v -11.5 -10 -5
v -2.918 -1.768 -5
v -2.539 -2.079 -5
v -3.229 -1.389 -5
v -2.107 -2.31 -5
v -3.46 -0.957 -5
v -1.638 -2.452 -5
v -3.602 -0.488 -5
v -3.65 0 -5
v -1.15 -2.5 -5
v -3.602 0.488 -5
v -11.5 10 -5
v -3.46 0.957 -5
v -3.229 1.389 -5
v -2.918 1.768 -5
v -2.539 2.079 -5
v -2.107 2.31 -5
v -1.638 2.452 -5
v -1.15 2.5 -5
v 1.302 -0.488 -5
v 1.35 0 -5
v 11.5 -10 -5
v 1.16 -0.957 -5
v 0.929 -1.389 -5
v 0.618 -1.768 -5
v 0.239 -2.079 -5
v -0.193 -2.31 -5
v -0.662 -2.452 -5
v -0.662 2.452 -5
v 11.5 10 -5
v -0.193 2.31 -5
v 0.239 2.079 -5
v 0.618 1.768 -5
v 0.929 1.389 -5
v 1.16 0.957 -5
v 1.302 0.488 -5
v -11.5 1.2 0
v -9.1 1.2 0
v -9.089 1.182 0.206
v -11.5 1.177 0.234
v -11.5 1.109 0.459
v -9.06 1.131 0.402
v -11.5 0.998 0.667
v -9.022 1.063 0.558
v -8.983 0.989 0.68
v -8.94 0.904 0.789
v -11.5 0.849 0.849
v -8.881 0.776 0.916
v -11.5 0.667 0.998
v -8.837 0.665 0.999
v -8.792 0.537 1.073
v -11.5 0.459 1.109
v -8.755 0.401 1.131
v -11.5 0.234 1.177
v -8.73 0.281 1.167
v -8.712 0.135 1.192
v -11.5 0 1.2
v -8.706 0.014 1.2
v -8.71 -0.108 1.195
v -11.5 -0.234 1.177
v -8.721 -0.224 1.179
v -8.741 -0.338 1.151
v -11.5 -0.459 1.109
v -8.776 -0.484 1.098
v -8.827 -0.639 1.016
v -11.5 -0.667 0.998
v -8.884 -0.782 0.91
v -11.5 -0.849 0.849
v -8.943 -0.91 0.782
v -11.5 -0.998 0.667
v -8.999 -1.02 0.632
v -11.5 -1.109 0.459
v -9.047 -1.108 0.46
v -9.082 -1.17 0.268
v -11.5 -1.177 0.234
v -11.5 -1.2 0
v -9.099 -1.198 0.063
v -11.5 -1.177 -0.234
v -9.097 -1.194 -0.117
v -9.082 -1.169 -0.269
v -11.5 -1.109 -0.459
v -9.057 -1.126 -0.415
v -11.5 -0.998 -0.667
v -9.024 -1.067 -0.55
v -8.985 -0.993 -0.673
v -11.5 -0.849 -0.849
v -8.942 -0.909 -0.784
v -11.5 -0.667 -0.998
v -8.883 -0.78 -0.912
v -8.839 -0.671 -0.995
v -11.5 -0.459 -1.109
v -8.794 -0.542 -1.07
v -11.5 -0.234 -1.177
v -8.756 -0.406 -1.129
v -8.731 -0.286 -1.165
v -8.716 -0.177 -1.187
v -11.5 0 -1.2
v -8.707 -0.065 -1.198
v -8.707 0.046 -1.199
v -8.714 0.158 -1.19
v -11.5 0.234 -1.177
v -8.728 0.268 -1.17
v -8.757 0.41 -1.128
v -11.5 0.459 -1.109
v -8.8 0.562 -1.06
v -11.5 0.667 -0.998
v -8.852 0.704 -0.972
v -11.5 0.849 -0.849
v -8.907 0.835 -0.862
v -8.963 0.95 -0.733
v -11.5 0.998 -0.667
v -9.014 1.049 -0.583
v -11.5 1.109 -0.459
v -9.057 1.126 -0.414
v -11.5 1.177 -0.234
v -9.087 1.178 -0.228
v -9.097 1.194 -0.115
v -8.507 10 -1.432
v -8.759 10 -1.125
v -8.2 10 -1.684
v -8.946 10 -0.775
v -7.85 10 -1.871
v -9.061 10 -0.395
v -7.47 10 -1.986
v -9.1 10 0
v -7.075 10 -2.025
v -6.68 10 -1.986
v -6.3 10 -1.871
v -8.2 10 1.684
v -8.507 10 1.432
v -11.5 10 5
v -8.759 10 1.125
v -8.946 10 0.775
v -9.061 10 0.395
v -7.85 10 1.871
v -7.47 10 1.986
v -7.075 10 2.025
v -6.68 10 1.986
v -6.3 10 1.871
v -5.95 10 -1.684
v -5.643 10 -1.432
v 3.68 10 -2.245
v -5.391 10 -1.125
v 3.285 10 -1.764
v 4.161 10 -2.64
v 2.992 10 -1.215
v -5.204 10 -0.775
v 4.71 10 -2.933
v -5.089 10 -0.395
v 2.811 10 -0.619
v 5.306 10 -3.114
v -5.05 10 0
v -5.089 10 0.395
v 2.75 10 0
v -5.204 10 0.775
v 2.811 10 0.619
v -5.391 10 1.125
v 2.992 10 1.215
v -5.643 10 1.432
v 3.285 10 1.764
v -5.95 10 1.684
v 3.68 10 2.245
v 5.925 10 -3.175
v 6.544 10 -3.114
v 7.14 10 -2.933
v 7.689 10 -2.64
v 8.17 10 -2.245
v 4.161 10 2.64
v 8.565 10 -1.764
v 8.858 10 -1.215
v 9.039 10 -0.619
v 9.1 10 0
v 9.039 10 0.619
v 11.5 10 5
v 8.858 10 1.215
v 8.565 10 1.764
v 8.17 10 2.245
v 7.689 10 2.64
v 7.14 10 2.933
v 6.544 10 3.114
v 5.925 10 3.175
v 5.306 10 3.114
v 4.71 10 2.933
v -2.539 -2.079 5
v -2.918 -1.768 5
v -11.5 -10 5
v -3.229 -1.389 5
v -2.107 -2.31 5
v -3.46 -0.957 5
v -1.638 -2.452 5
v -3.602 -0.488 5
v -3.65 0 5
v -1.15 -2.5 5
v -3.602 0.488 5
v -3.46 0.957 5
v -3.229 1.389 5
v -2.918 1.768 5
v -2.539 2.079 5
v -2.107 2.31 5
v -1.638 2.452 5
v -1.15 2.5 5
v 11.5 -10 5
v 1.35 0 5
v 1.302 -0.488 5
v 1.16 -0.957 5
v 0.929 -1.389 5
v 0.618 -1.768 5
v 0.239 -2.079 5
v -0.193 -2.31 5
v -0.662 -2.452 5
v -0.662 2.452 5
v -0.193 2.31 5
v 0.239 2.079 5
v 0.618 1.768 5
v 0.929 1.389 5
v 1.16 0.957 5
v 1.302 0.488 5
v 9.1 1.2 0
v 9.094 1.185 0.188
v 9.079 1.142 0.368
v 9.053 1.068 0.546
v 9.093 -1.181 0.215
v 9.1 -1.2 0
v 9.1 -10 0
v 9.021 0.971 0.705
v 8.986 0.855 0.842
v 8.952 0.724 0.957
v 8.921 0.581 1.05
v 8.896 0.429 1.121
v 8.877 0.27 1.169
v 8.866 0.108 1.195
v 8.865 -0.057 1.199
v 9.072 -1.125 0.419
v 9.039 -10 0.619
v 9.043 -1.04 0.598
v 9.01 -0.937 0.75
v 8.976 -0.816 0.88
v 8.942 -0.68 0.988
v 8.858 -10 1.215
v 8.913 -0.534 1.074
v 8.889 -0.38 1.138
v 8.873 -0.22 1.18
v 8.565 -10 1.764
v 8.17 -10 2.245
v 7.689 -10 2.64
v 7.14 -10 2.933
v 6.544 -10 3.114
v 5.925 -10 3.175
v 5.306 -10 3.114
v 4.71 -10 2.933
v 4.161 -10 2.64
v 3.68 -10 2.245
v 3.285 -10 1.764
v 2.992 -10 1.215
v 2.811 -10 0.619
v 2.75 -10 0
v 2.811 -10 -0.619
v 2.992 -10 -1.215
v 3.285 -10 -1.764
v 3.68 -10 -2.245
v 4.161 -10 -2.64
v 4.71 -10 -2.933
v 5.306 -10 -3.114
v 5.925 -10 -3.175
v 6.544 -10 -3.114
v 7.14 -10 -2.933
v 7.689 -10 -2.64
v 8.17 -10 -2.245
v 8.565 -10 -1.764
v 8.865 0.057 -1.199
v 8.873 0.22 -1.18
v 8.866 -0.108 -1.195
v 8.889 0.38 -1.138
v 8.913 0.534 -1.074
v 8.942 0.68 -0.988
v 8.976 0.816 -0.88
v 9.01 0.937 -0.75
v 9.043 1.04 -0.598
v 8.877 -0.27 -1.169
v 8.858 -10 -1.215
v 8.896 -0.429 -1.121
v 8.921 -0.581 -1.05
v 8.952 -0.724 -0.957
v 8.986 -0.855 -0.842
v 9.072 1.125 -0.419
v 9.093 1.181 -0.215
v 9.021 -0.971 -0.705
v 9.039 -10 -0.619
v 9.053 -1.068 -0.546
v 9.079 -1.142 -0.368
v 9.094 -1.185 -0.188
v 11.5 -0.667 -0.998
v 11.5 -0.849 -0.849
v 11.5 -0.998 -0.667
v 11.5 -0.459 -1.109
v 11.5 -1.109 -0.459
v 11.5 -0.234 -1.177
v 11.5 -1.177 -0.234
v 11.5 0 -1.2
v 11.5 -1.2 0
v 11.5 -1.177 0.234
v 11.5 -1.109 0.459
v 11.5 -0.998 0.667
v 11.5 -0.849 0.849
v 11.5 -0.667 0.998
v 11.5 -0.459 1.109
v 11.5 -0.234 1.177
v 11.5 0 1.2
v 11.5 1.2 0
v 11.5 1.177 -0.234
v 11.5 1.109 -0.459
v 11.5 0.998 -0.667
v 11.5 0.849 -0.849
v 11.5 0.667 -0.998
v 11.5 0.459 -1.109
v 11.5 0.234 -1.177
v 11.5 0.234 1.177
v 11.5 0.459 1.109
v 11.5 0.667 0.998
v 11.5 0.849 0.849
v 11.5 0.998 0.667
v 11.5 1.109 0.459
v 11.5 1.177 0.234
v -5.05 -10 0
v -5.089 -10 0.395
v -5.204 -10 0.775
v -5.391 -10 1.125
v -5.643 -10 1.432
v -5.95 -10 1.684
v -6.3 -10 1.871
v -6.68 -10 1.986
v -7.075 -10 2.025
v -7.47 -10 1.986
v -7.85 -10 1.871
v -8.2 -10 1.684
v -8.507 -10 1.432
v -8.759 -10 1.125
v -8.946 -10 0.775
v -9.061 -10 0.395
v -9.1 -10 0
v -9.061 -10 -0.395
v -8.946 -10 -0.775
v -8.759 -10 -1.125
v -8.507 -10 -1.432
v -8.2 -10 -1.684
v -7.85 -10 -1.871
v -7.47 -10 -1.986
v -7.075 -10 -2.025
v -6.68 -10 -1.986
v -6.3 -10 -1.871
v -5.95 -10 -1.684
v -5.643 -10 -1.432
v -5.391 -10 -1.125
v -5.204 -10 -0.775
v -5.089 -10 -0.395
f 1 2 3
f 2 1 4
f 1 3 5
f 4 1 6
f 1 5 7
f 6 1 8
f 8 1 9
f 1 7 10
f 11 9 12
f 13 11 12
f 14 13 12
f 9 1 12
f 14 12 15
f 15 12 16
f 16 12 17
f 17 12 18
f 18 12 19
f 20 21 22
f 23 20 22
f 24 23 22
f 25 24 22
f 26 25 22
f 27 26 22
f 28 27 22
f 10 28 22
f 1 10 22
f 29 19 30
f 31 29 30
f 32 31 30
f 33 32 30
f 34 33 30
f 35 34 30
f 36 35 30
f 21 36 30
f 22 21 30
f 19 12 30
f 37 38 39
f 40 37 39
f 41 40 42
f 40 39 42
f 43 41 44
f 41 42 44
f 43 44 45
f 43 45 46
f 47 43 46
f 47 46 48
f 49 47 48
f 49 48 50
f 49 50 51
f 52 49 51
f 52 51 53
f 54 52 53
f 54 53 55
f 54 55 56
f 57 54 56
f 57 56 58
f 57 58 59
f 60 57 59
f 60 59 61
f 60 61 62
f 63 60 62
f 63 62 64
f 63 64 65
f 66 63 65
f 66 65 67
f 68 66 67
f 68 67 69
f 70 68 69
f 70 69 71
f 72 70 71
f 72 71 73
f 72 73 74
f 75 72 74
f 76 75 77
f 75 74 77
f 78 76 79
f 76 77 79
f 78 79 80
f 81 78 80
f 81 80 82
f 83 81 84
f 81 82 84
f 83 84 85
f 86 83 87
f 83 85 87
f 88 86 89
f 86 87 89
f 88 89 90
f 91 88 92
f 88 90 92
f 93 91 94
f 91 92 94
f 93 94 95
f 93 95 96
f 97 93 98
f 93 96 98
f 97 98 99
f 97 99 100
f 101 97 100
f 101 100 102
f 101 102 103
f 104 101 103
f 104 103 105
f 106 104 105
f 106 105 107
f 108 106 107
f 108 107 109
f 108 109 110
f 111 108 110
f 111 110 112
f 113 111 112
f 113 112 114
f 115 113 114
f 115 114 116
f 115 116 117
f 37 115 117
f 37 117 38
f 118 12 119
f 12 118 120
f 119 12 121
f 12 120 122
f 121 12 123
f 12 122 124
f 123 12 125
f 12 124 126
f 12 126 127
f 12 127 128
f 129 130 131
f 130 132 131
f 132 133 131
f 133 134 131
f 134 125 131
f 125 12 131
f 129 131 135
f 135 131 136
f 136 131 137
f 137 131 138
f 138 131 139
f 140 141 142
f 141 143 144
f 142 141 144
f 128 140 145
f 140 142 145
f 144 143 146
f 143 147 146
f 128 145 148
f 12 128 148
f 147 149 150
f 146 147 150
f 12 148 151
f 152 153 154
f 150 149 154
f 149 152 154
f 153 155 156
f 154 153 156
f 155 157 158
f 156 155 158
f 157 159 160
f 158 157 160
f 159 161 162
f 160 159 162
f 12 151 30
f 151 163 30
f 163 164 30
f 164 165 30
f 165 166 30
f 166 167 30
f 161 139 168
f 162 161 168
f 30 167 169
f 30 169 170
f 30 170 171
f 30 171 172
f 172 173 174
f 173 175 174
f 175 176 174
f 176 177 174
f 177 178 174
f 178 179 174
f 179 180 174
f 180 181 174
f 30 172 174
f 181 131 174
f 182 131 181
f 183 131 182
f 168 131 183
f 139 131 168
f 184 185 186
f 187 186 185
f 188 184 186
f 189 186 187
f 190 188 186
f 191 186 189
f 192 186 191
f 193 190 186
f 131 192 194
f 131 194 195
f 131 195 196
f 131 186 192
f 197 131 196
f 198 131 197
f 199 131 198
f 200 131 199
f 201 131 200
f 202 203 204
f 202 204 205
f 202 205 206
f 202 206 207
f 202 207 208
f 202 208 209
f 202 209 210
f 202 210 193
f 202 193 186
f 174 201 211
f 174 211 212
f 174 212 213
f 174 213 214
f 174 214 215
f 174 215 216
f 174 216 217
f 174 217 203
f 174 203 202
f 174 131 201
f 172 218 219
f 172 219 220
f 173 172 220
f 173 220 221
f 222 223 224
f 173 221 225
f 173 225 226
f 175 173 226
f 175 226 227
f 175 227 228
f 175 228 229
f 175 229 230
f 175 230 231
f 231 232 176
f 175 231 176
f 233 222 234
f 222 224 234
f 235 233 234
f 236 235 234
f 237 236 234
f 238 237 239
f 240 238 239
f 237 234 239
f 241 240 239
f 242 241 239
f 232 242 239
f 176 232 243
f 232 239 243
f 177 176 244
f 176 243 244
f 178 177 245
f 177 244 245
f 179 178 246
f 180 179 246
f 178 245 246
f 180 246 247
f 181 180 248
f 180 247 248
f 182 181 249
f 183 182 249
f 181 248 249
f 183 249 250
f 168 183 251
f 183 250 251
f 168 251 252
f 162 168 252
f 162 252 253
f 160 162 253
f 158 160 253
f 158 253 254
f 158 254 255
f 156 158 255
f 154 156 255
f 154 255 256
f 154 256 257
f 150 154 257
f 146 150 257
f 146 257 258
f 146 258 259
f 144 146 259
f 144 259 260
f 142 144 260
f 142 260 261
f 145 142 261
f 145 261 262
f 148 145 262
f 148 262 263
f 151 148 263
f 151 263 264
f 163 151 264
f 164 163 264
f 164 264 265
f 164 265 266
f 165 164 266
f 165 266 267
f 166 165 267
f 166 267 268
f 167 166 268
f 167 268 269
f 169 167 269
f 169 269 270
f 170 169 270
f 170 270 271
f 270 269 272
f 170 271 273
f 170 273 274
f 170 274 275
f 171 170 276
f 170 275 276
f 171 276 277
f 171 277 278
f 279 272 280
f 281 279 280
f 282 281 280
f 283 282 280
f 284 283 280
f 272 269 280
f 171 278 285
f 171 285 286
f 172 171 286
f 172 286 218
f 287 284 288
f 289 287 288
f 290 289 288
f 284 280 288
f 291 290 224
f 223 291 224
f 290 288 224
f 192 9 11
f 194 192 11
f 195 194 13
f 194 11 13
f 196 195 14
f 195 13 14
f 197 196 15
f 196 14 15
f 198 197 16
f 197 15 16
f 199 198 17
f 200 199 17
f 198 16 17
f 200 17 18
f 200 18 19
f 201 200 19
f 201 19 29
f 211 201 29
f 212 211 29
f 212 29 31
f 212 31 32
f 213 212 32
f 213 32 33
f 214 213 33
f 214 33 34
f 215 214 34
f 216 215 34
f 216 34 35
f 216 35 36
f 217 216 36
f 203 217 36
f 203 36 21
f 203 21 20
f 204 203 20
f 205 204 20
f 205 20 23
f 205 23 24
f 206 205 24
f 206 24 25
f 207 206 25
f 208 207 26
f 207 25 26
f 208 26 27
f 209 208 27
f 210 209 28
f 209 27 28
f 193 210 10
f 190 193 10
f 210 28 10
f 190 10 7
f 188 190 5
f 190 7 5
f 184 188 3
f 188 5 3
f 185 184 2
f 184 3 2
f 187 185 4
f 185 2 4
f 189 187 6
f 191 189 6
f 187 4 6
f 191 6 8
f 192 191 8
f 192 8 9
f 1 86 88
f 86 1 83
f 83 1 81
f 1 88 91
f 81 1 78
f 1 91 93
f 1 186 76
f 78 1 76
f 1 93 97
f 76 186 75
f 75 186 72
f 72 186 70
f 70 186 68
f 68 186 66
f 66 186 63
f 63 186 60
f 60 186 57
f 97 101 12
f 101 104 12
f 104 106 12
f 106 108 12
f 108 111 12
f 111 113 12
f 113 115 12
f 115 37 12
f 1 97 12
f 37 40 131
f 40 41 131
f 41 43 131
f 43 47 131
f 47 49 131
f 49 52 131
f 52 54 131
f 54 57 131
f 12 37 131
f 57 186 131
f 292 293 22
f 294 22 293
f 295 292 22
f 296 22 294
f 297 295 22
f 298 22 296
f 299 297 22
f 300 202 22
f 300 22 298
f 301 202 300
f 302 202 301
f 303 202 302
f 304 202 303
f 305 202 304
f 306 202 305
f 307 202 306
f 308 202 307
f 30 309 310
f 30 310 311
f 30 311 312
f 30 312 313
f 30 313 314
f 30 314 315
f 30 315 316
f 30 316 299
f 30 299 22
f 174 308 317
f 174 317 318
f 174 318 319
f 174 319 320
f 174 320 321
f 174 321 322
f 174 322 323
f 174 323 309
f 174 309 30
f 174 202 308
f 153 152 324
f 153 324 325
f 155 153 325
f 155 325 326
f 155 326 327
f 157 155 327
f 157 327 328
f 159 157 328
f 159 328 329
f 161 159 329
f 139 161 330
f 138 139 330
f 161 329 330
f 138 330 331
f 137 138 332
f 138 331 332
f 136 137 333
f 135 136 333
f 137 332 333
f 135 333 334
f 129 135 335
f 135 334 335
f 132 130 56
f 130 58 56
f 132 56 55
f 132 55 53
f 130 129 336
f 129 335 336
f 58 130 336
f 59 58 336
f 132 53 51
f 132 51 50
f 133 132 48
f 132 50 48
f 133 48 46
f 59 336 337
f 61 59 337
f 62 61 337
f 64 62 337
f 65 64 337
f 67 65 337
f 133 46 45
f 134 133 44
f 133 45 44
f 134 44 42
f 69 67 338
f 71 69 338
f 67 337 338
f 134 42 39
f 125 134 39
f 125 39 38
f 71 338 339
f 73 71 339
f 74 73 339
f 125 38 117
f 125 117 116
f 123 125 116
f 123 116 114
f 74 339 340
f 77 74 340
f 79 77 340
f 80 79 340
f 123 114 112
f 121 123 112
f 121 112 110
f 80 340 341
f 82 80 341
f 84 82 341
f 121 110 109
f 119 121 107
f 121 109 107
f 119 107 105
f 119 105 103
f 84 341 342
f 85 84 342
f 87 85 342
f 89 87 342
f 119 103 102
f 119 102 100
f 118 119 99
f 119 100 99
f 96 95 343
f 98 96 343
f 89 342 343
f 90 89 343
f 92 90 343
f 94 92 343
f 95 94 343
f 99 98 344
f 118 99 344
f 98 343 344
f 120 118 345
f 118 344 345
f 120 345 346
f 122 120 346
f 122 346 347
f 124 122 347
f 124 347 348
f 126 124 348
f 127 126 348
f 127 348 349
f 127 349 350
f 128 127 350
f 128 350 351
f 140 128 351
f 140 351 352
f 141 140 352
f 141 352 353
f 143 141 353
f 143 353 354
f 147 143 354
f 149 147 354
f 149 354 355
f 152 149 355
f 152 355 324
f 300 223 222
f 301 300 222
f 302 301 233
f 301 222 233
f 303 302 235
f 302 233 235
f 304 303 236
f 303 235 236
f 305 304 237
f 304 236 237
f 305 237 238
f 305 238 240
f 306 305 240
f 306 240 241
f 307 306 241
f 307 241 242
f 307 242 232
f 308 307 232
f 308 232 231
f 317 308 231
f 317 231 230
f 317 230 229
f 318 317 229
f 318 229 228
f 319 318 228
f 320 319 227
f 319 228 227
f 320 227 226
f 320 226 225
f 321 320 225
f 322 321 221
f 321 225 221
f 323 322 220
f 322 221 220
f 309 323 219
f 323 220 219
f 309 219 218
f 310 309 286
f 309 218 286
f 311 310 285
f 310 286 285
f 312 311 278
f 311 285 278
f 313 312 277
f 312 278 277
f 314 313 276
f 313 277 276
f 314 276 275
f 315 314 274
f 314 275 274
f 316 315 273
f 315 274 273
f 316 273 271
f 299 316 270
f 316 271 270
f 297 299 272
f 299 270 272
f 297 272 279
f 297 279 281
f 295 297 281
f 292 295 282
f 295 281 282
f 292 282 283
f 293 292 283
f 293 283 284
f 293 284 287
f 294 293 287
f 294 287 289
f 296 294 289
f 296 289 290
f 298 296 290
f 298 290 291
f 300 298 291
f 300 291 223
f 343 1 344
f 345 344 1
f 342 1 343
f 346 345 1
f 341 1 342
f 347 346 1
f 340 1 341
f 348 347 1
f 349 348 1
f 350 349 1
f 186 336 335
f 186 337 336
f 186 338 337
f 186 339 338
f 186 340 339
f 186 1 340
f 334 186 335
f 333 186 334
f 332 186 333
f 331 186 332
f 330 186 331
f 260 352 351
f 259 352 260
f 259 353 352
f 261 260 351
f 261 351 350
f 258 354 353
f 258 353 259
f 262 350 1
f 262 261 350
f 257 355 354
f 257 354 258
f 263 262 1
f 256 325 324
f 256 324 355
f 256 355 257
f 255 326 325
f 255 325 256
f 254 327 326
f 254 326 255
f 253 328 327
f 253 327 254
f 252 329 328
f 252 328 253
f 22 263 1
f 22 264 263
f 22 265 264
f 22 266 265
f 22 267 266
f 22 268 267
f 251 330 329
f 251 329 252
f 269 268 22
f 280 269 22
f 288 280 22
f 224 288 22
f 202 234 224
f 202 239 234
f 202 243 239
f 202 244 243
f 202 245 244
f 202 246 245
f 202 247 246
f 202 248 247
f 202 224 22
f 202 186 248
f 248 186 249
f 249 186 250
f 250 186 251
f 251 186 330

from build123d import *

# Parameters (mm, degrees)
F0_W     = 23
F0_H     = 20
F1_DEPTH = 5
F2_R     = 2.025
F2_R_2   = 3.175
F3_DEPTH = 25
F5_D     = 5
F7_D     = 2.4
F7_DEPTH = 5
F7_TIP   = 0.7210327428
F9_D     = 2.4
F9_DEPTH = 5
F9_TIP   = 0.7210327428


with BuildPart() as f1:
    # F0 (on Top) → F1 (new body, symmetric)
    with BuildSketch(Plane.XY):
        Rectangle(F0_W, F0_H)
    extrude(amount=F1_DEPTH, both=True)

    # F2 (on face) → F3 (cut)
    with BuildSketch(Plane.XZ.offset(10)):
        with Locations((-7.075, 0)):
            Circle(F2_R)
        with Locations((5.925, 0)):
            Circle(F2_R_2)
    extrude(amount=-F3_DEPTH, mode=Mode.SUBTRACT)

    # F5 (through all)
    with Locations(Plane.XY.offset(5)):
        with Locations((-1.15, 0)):
            Hole(F5_D / 2)

    # F7
    with Locations(Plane(origin=(-11.5, 0, 0), x_dir=(0, -1, 0), z_dir=(-1, 0, 0))):
        with Locations((0, 0)):
            Hole(F7_D / 2, depth=F7_DEPTH)
            with Locations((0, 0, -(F7_DEPTH + F7_TIP / 2))):  # 118° drill point
                Cone(0, F7_D / 2, F7_TIP, mode=Mode.SUBTRACT)

    # F9
    with Locations(Plane.YZ.offset(11.5)):
        with Locations((0, 0)):
            Hole(F9_D / 2, depth=F9_DEPTH)
            with Locations((0, 0, -(F9_DEPTH + F9_TIP / 2))):  # 118° drill point
                Cone(0, F9_D / 2, F9_TIP, mode=Mode.SUBTRACT)


solid = f1.part
